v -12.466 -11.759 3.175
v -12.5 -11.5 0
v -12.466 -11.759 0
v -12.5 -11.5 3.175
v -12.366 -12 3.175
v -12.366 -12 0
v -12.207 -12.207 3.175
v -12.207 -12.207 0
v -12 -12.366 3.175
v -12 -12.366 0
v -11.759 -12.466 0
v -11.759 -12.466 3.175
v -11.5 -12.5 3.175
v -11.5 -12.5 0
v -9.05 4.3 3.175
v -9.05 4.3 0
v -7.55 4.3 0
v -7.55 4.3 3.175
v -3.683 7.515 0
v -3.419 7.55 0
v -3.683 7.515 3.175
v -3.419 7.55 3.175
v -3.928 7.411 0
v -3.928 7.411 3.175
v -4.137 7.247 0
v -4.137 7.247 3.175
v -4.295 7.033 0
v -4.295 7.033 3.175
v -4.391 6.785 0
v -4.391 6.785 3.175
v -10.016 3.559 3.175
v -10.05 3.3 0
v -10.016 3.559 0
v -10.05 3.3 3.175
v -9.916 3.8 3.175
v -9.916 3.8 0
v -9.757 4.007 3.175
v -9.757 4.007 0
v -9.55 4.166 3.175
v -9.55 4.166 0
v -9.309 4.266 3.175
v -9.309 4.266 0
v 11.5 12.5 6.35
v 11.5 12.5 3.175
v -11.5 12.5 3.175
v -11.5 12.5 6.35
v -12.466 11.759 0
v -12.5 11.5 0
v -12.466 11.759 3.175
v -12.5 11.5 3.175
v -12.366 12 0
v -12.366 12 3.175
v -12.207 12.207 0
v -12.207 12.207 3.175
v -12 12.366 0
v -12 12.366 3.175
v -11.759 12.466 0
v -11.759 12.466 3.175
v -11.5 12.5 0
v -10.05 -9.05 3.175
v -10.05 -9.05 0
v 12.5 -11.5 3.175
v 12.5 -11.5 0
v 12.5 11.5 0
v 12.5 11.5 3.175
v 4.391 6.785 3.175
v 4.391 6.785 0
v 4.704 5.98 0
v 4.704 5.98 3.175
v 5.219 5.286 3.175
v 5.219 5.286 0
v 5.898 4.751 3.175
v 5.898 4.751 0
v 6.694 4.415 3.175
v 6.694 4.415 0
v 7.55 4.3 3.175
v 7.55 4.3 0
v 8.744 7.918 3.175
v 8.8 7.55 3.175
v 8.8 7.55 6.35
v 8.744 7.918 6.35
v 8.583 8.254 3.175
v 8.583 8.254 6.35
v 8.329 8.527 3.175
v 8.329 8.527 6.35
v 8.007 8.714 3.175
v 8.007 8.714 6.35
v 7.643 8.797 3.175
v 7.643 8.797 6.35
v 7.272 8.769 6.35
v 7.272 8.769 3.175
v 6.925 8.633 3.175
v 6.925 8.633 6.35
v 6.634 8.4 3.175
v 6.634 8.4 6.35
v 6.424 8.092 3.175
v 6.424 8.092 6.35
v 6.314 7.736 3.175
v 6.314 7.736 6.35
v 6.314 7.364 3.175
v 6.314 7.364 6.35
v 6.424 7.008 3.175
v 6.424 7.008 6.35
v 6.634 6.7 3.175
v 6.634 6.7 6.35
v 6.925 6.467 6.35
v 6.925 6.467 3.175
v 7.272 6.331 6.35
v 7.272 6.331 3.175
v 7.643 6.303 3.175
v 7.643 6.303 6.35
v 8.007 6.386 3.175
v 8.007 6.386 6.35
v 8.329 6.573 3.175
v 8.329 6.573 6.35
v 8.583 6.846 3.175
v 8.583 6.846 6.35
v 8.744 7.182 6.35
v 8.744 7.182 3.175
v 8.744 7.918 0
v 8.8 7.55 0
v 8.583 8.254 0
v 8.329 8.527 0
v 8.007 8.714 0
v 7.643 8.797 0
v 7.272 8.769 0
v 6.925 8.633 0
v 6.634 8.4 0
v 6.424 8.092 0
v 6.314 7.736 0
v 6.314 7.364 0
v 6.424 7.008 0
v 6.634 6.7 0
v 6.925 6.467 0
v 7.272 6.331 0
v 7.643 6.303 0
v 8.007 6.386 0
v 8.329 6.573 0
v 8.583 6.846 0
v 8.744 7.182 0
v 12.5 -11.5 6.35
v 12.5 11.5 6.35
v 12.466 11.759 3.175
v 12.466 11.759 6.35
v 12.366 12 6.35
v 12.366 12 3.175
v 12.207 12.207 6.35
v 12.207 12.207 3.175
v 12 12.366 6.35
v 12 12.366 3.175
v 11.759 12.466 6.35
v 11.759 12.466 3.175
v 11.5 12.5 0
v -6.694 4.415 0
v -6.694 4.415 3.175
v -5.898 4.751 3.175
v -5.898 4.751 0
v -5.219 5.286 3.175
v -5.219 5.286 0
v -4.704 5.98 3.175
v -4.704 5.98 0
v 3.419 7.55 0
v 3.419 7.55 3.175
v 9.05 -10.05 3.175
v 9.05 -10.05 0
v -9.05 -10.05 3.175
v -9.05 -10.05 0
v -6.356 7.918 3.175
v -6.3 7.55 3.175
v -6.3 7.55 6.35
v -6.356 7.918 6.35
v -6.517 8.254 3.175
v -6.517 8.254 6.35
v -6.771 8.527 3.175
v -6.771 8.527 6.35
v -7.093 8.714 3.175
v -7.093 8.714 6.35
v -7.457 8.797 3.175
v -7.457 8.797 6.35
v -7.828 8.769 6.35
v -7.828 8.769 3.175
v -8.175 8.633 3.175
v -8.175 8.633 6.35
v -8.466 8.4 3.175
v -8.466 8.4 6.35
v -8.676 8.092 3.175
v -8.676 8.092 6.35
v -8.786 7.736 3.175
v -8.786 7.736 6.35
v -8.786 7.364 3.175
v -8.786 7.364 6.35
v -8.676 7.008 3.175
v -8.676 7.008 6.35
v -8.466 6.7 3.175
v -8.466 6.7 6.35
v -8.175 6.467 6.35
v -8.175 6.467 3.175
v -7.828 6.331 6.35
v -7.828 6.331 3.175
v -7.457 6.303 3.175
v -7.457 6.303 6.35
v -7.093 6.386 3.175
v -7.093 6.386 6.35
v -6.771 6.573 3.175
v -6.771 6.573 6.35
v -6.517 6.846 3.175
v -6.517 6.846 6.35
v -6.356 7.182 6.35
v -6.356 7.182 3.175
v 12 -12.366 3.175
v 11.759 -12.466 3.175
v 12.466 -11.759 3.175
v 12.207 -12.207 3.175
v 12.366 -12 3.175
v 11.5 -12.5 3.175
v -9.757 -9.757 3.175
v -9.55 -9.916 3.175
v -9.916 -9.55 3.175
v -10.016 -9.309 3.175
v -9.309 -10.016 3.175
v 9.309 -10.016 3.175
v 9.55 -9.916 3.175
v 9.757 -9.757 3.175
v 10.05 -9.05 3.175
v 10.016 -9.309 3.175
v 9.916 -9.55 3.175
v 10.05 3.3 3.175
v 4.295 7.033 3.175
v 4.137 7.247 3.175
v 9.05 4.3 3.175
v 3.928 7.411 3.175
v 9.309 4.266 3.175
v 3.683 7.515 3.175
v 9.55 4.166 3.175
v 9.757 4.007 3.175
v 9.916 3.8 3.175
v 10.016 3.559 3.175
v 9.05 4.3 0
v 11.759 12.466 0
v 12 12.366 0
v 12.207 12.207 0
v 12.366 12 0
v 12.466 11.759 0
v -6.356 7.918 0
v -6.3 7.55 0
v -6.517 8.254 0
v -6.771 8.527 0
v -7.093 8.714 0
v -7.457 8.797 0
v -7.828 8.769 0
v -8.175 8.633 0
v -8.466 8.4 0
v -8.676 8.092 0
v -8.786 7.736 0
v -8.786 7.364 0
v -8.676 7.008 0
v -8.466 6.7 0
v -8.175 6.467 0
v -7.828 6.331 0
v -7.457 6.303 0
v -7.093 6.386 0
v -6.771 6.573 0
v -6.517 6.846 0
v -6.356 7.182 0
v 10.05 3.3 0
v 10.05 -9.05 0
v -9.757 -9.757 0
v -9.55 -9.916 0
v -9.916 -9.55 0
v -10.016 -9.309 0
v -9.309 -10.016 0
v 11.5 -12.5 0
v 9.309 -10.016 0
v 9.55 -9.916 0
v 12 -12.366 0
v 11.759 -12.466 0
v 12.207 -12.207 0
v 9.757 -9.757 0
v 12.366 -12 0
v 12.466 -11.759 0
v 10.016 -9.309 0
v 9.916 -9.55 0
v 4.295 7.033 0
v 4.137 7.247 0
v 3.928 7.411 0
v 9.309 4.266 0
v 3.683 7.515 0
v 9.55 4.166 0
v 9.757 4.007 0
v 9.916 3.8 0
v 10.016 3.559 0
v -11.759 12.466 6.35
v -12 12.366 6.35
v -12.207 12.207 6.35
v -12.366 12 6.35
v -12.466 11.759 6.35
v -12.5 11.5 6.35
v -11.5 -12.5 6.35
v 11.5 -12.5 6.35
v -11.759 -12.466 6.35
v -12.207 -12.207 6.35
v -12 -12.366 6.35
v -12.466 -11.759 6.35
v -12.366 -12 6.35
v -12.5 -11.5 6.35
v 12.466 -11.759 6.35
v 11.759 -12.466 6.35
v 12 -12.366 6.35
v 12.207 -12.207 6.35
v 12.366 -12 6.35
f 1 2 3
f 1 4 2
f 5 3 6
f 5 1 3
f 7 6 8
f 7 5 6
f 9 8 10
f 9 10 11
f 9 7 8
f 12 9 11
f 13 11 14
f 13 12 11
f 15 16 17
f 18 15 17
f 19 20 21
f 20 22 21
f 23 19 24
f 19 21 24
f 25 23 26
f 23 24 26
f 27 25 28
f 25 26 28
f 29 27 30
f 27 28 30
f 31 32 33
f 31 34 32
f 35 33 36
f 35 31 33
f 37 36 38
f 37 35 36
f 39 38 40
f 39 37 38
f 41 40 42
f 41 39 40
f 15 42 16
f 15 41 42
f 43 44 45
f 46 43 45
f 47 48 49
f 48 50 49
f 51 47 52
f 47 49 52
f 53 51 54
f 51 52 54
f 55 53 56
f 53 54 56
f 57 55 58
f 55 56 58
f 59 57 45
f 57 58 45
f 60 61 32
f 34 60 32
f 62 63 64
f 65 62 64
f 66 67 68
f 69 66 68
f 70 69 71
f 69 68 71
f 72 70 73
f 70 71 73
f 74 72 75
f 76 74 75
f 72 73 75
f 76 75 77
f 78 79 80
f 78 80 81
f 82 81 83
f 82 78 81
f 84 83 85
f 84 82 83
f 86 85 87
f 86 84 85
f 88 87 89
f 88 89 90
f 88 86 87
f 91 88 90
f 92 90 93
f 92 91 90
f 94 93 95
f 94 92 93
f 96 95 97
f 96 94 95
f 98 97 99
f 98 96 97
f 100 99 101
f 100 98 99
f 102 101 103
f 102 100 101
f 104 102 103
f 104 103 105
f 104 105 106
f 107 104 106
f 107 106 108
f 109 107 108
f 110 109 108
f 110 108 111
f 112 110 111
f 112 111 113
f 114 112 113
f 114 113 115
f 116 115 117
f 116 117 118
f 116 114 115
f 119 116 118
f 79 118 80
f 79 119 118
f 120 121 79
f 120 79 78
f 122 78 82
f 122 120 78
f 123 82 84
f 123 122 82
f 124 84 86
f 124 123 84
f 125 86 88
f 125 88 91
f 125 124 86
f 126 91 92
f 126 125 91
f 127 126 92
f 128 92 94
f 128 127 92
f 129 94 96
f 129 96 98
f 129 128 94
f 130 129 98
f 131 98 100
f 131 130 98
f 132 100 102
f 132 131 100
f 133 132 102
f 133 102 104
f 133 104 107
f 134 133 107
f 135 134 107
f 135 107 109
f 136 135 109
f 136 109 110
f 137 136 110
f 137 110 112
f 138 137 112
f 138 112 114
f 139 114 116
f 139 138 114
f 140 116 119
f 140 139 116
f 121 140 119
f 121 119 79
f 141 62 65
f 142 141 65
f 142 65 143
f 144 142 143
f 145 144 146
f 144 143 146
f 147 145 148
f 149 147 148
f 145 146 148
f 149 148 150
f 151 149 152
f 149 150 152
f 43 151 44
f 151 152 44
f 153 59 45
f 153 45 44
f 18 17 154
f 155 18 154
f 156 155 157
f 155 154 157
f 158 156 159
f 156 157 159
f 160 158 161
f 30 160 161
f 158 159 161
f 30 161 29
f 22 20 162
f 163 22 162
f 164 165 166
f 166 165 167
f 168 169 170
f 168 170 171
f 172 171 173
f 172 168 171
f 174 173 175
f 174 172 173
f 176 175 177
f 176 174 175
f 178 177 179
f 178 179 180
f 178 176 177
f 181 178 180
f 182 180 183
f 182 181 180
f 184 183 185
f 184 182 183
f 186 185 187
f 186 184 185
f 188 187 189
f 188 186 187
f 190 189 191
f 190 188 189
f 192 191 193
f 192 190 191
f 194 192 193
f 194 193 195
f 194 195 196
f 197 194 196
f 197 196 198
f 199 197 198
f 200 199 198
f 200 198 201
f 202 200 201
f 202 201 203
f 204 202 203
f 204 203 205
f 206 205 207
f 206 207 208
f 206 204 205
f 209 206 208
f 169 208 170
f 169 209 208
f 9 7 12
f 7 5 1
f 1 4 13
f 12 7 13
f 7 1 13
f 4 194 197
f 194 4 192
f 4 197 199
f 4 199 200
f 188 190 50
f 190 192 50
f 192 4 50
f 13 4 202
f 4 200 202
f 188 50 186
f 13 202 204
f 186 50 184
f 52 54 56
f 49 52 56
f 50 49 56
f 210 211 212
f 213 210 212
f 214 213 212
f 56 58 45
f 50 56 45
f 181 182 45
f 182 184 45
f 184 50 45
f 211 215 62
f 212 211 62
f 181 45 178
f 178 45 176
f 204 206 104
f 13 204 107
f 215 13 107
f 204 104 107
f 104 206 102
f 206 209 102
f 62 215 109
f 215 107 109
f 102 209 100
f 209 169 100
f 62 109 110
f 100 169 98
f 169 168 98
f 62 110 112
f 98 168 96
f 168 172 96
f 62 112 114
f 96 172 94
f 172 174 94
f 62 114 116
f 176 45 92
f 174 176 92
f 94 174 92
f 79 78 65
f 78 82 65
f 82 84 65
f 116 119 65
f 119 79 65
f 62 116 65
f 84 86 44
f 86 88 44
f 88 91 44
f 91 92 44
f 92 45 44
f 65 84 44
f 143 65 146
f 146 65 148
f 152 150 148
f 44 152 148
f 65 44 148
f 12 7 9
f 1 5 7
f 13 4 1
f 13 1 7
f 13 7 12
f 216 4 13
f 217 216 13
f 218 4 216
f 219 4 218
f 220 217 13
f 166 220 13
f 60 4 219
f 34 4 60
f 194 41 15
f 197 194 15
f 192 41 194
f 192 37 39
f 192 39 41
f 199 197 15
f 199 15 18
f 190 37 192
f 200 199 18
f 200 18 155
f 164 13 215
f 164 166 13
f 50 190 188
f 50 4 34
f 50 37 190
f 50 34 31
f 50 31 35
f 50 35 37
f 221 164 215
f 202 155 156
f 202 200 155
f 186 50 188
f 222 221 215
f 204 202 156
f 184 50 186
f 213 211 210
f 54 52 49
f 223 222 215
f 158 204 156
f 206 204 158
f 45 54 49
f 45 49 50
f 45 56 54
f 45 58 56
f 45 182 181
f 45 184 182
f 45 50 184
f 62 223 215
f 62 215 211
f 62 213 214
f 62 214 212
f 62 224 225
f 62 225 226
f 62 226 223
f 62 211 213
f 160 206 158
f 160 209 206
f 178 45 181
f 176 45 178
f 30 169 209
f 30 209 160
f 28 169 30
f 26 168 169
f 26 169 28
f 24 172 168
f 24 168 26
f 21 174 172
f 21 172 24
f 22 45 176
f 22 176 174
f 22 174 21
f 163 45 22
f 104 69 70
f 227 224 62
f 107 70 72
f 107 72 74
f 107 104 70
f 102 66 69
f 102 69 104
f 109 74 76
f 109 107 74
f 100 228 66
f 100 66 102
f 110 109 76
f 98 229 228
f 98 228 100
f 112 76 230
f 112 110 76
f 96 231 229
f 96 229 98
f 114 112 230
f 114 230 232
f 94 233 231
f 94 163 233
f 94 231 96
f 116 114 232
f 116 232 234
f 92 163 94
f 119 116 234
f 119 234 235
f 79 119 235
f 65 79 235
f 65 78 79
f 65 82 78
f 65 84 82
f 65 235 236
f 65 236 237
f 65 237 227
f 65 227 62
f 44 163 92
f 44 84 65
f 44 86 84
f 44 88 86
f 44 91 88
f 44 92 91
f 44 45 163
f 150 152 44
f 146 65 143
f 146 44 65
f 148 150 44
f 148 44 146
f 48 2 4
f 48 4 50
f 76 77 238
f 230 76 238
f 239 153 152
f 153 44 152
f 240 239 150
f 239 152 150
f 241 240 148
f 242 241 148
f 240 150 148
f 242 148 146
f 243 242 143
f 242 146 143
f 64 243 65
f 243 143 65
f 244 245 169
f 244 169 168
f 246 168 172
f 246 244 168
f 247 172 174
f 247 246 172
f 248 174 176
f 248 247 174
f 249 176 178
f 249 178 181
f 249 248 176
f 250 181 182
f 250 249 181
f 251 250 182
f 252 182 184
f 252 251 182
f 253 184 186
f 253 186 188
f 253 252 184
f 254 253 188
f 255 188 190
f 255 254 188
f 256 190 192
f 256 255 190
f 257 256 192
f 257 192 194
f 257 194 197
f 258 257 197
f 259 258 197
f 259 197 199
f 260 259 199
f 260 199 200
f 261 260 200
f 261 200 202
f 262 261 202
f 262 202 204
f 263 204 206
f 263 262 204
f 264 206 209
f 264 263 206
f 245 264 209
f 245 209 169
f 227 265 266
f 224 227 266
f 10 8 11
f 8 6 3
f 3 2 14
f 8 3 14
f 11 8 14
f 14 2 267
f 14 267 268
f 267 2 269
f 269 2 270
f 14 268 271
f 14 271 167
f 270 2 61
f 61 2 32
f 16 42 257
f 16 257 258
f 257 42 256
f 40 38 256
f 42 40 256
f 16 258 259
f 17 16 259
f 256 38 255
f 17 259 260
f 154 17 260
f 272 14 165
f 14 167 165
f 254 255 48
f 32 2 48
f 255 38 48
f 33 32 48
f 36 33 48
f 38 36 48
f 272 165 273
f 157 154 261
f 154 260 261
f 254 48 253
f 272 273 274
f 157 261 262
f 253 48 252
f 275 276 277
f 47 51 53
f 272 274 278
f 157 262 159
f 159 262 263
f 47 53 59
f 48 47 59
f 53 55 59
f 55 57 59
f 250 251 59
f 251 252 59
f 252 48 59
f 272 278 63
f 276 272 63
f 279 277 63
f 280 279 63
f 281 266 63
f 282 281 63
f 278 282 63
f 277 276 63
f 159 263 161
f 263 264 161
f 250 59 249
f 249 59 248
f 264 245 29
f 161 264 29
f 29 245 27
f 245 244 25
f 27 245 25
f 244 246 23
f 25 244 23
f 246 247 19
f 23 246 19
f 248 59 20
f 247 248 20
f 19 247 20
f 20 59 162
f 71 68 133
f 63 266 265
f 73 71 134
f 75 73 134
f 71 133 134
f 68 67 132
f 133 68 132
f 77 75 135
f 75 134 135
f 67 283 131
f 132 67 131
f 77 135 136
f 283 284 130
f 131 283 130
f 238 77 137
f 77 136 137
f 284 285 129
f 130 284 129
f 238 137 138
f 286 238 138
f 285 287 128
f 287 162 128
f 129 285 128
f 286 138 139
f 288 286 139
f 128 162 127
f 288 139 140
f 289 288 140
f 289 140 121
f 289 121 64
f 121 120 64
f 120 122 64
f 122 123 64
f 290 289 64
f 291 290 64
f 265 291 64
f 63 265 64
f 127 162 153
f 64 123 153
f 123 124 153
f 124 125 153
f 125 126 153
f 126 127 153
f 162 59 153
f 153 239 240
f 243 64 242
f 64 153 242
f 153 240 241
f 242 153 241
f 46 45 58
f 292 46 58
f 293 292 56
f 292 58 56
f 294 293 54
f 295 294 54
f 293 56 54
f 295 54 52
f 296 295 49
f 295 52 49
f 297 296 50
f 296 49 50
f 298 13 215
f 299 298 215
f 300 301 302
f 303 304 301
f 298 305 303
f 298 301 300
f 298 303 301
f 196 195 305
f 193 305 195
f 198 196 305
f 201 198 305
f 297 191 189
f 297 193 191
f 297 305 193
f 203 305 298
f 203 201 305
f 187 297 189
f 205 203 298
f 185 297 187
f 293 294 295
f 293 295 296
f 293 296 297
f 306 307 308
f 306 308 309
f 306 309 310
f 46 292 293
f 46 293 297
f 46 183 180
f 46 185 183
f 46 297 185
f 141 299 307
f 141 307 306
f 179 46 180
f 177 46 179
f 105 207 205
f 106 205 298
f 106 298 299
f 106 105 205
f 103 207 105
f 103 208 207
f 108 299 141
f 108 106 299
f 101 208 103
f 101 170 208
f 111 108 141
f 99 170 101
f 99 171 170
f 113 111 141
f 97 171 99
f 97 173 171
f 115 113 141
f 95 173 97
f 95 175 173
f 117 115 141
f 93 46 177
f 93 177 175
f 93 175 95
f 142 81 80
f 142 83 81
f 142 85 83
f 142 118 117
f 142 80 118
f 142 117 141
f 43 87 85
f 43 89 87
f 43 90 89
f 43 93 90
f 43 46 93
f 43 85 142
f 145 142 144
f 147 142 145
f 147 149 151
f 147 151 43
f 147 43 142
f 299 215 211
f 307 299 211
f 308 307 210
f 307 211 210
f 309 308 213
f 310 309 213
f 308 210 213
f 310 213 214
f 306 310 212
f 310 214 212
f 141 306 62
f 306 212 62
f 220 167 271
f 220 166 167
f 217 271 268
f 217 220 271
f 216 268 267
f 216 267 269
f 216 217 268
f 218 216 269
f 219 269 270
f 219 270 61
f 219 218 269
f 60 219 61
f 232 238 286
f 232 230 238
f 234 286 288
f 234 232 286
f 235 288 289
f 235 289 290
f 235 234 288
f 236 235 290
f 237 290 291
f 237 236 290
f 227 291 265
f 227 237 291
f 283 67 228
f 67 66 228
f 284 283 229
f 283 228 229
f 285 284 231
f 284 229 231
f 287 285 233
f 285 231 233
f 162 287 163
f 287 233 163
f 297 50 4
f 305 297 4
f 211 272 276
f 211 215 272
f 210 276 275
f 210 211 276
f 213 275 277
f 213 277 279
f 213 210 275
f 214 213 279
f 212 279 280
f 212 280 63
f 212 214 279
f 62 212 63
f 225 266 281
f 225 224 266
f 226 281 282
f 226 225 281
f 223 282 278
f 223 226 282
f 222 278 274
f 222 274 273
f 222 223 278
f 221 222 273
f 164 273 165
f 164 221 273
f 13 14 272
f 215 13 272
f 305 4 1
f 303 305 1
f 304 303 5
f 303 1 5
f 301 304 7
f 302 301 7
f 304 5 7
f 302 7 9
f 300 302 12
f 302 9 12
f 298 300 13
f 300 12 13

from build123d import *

# Parameters (mm, degrees)
F1_W     = 25
F1_H     = 25
F1_R     = 1.25
F2_DEPTH = 3.175
F3_R     = 1
F4_R     = 1.25
F5_DEPTH = 3.175


with BuildPart() as f2:
    # F1 (on Top) → F2 (new body)
    with BuildSketch(Plane.XY):
        Rectangle(F1_W, F1_H)
        with BuildLine():
            Line((10.05, 4.3), (10.05, -10.05))
            Line((10.05, -10.05), (-10.05, -10.05))
            Line((-10.05, -10.05), (-10.05, 4.3))
            Line((-10.05, 4.3), (-7.55, 4.3))
            ThreePointArc((-7.55, 4.3), (-5.251903, 5.251903), (-4.3, 7.55))
            Line((-4.3, 7.55), (4.3, 7.55))
            ThreePointArc((4.3, 7.55), (5.251903, 5.251903), (7.55, 4.3))
            Line((7.55, 4.3), (10.05, 4.3))
        make_face(mode=Mode.SUBTRACT)
        with Locations((-7.55, 7.55)):
            Circle(F1_R, mode=Mode.SUBTRACT)
        with Locations((7.55, 7.55)):
            Circle(F1_R, mode=Mode.SUBTRACT)
    extrude(amount=F2_DEPTH)

    # F3
    f3_edges = [f2.edges().sort_by_distance(p)[0] for p in [
        (-12.5, 12.5, 1.5875),
        (12.5, 12.5, 1.5875),
        (12.5, -12.5, 1.5875),
        (-12.5, -12.5, 1.5875),
        (-10.05, -10.05, 1.5875),
        (10.05, -10.05, 1.5875),
        (-10.05, 4.3, 1.5875),
        (-4.3, 7.55, 1.5875),
        (4.3, 7.55, 1.5875),
        (10.05, 4.3, 1.5875),
    ]]
    fillet(f3_edges, radius=F3_R)


with BuildPart() as f5:
    # F4 (on face) → F5 (new body)
    with BuildSketch(Plane.XY.offset(3.175)):
        with BuildLine():
            ThreePointArc((12.5, 11.5), (12.207107, 12.207107), (11.5, 12.5))
            Line((11.5, 12.5), (-11.5, 12.5))
            ThreePointArc((-11.5, 12.5), (-12.207107, 12.207107), (-12.5, 11.5))
            Line((-12.5, 11.5), (-12.5, -11.5))
            ThreePointArc((-12.5, -11.5), (-12.207107, -12.207107), (-11.5, -12.5))
            Line((-11.5, -12.5), (11.5, -12.5))
            ThreePointArc((11.5, -12.5), (12.207107, -12.207107), (12.5, -11.5))
            Line((12.5, -11.5), (12.5, 11.5))
        make_face()
        with Locations((-7.55, 7.55)):
            Circle(F4_R, mode=Mode.SUBTRACT)
        with Locations((7.55, 7.55)):
            Circle(F4_R, mode=Mode.SUBTRACT)
    extrude(amount=F5_DEPTH)


solid = Compound([f2.part, f5.part])
